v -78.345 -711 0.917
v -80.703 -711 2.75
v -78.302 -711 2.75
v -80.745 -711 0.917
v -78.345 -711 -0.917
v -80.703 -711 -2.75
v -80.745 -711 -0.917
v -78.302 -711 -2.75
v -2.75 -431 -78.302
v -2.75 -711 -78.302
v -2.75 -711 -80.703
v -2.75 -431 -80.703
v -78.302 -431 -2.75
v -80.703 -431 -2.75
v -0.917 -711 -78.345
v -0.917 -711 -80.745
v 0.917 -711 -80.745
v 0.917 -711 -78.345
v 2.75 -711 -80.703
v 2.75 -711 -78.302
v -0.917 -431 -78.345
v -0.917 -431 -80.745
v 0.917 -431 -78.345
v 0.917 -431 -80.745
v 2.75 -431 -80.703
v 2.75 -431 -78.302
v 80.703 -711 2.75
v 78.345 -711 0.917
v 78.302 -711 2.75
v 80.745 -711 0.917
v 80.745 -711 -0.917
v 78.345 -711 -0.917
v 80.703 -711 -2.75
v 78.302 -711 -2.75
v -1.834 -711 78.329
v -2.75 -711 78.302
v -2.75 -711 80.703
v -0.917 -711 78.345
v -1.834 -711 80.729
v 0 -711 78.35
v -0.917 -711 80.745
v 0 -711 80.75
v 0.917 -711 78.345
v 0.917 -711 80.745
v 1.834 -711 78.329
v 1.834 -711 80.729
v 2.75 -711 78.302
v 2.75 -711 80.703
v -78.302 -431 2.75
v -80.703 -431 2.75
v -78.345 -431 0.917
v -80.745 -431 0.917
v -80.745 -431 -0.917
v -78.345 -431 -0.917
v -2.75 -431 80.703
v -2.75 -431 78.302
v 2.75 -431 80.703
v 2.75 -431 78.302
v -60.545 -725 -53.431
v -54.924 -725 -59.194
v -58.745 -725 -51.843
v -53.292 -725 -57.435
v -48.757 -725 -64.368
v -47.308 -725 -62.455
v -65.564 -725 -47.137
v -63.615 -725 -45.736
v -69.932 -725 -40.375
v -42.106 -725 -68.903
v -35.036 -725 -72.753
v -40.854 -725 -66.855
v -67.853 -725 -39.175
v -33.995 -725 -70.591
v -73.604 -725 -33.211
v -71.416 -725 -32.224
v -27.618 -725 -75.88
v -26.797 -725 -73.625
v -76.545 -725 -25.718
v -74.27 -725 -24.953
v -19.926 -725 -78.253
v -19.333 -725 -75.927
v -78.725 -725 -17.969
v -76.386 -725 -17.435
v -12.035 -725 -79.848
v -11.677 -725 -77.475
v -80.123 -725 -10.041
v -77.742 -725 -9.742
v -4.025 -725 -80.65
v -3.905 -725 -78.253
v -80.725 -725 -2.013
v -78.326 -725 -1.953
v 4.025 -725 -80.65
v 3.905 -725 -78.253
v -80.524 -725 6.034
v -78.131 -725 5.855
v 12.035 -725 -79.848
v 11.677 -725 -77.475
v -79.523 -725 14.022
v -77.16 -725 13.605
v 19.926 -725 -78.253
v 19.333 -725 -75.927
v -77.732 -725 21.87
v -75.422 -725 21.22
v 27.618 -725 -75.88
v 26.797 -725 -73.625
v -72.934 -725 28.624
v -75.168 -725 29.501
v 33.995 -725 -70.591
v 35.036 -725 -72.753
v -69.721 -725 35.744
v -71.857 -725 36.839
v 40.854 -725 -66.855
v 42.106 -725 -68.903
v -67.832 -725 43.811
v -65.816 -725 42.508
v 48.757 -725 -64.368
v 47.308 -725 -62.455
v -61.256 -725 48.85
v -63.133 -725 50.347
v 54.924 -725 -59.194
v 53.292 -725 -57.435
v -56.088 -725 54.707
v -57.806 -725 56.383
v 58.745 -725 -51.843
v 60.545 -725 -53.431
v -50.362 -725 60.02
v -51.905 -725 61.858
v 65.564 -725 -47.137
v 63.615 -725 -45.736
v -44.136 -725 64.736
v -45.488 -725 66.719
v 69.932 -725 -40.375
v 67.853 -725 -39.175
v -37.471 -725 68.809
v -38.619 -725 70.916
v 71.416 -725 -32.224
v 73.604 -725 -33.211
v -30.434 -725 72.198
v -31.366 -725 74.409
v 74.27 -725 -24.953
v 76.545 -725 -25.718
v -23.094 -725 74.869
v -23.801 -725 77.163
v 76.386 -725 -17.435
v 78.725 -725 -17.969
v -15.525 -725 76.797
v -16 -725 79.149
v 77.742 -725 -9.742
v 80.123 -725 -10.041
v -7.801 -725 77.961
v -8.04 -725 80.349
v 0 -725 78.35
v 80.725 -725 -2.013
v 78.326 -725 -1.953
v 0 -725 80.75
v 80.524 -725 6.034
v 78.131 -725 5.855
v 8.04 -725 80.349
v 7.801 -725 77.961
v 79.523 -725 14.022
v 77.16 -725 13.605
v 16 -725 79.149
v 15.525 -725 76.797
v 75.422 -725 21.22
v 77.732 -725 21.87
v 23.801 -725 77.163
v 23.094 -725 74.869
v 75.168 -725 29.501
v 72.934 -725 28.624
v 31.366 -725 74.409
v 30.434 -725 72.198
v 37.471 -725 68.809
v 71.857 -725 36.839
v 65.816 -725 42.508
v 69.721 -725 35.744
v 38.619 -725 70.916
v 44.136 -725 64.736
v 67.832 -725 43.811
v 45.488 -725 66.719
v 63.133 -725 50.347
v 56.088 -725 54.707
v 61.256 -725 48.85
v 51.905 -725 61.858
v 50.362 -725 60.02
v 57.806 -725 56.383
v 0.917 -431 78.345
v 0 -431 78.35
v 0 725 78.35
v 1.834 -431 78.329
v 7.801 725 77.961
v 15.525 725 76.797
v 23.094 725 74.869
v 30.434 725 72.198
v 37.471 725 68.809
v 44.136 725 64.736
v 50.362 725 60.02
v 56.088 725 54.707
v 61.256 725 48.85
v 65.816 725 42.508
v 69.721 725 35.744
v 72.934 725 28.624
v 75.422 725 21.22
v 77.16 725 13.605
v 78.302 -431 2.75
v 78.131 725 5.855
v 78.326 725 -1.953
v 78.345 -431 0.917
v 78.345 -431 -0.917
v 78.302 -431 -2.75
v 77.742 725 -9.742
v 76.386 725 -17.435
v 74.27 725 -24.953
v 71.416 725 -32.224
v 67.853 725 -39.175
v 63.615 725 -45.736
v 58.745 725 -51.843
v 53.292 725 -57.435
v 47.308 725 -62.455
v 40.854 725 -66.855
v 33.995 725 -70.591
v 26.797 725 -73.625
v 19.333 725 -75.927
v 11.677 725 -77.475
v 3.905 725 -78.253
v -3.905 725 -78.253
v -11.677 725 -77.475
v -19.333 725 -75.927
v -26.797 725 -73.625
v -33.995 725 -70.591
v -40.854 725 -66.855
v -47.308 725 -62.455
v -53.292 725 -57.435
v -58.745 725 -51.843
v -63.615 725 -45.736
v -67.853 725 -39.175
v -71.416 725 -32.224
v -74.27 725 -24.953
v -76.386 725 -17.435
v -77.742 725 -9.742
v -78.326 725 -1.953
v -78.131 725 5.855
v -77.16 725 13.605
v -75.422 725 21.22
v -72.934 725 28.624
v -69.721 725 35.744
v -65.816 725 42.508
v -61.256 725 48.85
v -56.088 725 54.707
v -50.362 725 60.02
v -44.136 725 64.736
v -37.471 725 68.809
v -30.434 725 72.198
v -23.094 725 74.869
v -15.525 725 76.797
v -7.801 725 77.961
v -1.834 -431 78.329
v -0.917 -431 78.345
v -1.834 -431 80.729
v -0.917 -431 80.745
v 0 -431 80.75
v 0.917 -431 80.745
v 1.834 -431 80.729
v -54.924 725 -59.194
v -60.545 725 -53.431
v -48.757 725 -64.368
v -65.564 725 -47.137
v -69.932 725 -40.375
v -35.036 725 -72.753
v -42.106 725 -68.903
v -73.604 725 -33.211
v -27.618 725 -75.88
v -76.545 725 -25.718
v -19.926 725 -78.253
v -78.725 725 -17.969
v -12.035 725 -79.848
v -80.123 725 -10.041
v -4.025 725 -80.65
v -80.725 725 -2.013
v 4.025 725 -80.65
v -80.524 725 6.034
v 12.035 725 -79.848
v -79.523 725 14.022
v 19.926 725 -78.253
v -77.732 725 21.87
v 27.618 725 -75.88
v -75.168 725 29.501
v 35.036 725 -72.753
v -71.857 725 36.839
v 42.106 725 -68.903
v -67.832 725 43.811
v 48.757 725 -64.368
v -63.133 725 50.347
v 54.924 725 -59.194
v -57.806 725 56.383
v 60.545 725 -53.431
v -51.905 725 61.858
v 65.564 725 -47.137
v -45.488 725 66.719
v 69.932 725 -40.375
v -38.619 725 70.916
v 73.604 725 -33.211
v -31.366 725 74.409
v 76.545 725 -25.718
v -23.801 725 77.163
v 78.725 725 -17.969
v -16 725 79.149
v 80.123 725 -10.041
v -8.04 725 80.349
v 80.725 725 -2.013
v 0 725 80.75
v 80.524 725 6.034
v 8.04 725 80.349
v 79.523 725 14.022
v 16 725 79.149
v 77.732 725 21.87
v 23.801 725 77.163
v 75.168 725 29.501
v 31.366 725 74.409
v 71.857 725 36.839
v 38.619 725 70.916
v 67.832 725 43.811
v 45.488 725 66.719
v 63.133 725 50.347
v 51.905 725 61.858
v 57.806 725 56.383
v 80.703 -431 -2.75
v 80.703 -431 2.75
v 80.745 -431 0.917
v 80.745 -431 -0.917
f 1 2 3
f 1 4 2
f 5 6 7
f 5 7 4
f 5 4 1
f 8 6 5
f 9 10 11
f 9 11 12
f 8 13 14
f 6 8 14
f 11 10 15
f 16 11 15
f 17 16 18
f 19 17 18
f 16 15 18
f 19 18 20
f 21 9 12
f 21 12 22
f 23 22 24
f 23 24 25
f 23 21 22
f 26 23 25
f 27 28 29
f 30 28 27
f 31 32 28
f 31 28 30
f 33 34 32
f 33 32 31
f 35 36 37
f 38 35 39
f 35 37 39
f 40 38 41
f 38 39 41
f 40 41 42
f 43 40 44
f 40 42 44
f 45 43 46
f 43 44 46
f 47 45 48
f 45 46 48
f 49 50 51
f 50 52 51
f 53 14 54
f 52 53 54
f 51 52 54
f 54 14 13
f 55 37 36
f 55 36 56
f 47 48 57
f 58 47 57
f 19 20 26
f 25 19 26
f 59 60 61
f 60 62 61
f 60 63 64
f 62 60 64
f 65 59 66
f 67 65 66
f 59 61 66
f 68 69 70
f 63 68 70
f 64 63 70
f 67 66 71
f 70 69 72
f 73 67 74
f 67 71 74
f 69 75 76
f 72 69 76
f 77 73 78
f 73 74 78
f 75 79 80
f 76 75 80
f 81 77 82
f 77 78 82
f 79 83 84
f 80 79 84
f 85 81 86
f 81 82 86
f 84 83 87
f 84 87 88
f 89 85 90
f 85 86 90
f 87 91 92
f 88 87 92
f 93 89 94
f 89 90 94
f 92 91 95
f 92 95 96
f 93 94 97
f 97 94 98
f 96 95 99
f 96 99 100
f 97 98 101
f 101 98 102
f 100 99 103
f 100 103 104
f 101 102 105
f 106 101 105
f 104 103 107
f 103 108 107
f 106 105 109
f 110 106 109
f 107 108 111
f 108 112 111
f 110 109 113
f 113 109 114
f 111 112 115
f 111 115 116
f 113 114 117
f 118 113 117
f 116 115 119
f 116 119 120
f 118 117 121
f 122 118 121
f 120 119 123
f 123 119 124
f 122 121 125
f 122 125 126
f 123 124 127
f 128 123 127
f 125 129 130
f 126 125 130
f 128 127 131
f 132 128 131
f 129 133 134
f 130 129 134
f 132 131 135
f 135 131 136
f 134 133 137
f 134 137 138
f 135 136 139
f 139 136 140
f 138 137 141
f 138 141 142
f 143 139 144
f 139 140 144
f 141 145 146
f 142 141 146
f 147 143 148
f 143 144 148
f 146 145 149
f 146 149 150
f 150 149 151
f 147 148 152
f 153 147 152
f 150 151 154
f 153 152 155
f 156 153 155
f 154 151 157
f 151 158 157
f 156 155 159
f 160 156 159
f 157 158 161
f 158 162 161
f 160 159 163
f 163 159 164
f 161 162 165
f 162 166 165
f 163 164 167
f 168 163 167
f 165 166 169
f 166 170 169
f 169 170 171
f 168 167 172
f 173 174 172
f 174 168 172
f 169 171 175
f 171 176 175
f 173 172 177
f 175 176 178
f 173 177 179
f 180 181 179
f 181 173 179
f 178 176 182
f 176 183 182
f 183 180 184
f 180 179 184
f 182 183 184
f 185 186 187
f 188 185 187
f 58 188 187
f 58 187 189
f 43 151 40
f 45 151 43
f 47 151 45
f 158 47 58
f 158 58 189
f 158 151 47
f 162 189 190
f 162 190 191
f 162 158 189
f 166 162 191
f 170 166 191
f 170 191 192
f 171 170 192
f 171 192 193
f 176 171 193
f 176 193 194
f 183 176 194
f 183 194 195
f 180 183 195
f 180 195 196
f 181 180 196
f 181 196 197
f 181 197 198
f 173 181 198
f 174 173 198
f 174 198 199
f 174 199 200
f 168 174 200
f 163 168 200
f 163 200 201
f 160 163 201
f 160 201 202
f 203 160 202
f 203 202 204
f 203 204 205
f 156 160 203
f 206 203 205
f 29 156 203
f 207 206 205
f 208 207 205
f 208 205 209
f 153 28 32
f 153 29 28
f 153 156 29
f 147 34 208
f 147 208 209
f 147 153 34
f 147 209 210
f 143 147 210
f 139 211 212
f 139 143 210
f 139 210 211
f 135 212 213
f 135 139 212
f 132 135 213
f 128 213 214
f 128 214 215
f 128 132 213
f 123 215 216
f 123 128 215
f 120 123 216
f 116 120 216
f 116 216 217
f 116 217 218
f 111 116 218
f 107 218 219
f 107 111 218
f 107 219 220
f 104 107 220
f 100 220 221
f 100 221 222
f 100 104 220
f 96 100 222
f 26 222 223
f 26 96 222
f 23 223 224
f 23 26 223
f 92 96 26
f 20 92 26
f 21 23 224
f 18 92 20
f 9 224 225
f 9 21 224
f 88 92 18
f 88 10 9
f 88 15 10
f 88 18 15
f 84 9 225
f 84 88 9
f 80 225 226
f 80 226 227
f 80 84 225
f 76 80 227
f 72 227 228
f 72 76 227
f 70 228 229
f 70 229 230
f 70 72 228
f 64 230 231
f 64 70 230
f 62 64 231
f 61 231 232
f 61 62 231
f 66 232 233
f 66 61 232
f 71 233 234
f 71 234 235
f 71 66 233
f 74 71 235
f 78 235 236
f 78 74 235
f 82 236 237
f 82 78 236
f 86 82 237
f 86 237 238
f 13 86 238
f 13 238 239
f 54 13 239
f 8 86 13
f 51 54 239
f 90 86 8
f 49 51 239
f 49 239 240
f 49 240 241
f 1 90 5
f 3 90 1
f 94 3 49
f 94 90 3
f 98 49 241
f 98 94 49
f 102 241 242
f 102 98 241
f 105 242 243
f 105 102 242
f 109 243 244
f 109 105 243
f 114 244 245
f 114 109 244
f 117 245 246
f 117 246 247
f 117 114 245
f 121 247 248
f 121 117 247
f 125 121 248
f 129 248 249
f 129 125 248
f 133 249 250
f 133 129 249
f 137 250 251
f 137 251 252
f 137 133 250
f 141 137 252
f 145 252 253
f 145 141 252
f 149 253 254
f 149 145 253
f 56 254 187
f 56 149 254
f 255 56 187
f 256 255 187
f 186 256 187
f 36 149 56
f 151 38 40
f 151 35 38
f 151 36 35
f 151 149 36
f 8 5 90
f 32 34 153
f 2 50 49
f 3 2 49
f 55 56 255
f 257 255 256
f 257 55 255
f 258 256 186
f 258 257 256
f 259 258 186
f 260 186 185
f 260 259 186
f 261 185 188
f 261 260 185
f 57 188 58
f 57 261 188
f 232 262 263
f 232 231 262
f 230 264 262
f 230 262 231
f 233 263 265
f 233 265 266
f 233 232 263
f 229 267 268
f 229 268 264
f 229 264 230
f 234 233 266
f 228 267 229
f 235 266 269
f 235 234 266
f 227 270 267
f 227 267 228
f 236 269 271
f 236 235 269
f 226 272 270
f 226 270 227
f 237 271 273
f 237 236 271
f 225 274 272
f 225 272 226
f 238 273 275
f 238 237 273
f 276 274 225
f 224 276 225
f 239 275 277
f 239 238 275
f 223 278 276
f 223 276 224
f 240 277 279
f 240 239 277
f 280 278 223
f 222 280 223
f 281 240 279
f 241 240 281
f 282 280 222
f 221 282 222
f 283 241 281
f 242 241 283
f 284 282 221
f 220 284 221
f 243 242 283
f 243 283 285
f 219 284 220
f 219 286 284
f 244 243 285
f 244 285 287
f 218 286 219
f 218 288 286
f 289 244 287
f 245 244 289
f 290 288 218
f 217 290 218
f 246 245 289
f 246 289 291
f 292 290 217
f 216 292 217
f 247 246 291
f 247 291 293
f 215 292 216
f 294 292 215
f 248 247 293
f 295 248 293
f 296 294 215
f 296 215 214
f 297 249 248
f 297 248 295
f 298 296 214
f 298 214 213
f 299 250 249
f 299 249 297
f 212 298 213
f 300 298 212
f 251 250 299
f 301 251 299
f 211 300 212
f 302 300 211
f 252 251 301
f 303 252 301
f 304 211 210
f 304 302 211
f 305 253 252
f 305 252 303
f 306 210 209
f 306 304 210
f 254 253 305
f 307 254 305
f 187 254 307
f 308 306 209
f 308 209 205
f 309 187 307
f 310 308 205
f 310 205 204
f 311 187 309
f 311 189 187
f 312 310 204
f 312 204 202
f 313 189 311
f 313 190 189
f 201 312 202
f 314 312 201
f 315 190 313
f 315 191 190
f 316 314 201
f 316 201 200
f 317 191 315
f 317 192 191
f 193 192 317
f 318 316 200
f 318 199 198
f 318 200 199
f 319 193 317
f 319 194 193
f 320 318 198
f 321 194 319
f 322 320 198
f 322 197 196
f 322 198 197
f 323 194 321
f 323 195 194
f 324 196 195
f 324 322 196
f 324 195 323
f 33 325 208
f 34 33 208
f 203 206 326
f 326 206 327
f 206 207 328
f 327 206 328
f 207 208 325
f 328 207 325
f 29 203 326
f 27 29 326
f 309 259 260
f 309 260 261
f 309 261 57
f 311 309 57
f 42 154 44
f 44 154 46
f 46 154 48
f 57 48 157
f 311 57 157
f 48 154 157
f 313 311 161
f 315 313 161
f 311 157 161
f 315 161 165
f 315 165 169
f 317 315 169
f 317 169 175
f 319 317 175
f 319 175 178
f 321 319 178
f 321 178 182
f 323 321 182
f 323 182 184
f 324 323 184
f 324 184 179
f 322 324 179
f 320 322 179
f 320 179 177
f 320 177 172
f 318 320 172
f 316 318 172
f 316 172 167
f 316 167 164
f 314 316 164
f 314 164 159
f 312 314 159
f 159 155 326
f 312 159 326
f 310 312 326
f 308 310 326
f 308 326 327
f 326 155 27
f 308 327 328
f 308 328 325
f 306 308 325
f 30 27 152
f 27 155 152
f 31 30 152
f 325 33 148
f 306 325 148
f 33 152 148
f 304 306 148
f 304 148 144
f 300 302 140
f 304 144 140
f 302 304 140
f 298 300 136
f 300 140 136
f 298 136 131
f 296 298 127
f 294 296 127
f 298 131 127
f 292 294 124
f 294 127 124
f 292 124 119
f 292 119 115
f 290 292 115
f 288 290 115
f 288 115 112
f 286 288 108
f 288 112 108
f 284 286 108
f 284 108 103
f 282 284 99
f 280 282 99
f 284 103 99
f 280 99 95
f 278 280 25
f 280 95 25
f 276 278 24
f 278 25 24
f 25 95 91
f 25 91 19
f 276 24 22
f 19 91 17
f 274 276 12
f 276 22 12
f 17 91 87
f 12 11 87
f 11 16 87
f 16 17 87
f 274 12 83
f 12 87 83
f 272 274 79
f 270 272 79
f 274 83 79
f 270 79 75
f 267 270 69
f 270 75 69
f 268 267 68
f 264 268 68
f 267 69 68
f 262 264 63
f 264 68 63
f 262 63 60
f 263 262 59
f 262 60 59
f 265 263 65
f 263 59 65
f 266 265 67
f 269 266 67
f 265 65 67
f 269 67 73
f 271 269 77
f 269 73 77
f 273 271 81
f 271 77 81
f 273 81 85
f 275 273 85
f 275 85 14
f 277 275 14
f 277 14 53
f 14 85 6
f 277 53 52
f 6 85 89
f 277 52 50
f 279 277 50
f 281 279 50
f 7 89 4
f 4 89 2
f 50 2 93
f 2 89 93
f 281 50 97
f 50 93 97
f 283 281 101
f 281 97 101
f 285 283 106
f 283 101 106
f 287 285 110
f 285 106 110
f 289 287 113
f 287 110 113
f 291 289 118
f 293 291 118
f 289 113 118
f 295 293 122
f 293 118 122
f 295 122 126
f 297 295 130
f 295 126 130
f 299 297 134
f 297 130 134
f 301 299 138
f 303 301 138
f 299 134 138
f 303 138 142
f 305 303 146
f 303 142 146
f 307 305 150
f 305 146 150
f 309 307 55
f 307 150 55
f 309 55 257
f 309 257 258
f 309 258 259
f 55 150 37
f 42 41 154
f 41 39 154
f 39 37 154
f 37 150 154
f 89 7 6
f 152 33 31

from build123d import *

# Parameters (mm, degrees)
BOSS_EXTRUDE1_DEPTH      = 725
BOSS_EXTRUDE1_DEPTH_BACK = 725
SKETCH1_R                = 80.75
SKETCH1_R_2              = 78.35
SKETCH2_W                = 5.5
SKETCH2_H                = 280
CUT_EXTRUDE1_DEPTH       = 734.938774694
CIRPATTERN1_START        = -711
CIRPATTERN1_DEPTH        = 280


# Read off the part's stored shape, not the designer's step: CirPattern1
with BuildPart() as part:
    # Sketch1 → Boss-Extrude1 (new, two sides: drawn at the far end of the back side and taken through both)
    with BuildSketch(Plane(origin=(0, 0, 0), x_dir=(1, 0, 0), z_dir=(0, 1, 0)).offset(-BOSS_EXTRUDE1_DEPTH_BACK)):
        with Locations(Location((0, 0, 0), (0, 0, 270))):
            Circle(SKETCH1_R)
        with Locations(Location((0, 0, 0), (0, 0, 270))):
            Circle(SKETCH1_R_2, mode=Mode.SUBTRACT)
    extrude(amount=BOSS_EXTRUDE1_DEPTH + BOSS_EXTRUDE1_DEPTH_BACK)

    # Sketch2 → Cut-Extrude1 (cut, symmetric)
    with BuildSketch(Plane.XY):
        with Locations((0, -571)):
            Rectangle(SKETCH2_W, SKETCH2_H)
    extrude(amount=CUT_EXTRUDE1_DEPTH, both=True, mode=Mode.SUBTRACT)

    # CirPattern1 outline → CirPattern1 (cut)
    with BuildSketch(Plane(origin=(0, 0, 0), x_dir=(1, 0, 0), z_dir=(0, 1, 0)).offset(CIRPATTERN1_START)):
        with BuildLine():
            ThreePointArc((78.301724119, 2.75), (78.35, 0), (78.301724119, -2.75))
            Line((78.301724119, -2.75), (80.703159789, -2.75))
            ThreePointArc((80.703159789, -2.75), (80.75, 0), (80.703159789, 2.75))
            Line((80.703159789, 2.75), (78.301724119, 2.75))
        make_face()
        with BuildLine():
            Line((-80.703159789, -2.75), (-78.301724119, -2.75))
            ThreePointArc((-78.301724119, -2.75), (-78.35, 0), (-78.301724119, 2.75))
            Line((-78.301724119, 2.75), (-80.703159789, 2.75))
            ThreePointArc((-80.703159789, 2.75), (-80.75, 0), (-80.703159789, -2.75))
        make_face()
    extrude(amount=CIRPATTERN1_DEPTH, mode=Mode.SUBTRACT)


solid = part.part
